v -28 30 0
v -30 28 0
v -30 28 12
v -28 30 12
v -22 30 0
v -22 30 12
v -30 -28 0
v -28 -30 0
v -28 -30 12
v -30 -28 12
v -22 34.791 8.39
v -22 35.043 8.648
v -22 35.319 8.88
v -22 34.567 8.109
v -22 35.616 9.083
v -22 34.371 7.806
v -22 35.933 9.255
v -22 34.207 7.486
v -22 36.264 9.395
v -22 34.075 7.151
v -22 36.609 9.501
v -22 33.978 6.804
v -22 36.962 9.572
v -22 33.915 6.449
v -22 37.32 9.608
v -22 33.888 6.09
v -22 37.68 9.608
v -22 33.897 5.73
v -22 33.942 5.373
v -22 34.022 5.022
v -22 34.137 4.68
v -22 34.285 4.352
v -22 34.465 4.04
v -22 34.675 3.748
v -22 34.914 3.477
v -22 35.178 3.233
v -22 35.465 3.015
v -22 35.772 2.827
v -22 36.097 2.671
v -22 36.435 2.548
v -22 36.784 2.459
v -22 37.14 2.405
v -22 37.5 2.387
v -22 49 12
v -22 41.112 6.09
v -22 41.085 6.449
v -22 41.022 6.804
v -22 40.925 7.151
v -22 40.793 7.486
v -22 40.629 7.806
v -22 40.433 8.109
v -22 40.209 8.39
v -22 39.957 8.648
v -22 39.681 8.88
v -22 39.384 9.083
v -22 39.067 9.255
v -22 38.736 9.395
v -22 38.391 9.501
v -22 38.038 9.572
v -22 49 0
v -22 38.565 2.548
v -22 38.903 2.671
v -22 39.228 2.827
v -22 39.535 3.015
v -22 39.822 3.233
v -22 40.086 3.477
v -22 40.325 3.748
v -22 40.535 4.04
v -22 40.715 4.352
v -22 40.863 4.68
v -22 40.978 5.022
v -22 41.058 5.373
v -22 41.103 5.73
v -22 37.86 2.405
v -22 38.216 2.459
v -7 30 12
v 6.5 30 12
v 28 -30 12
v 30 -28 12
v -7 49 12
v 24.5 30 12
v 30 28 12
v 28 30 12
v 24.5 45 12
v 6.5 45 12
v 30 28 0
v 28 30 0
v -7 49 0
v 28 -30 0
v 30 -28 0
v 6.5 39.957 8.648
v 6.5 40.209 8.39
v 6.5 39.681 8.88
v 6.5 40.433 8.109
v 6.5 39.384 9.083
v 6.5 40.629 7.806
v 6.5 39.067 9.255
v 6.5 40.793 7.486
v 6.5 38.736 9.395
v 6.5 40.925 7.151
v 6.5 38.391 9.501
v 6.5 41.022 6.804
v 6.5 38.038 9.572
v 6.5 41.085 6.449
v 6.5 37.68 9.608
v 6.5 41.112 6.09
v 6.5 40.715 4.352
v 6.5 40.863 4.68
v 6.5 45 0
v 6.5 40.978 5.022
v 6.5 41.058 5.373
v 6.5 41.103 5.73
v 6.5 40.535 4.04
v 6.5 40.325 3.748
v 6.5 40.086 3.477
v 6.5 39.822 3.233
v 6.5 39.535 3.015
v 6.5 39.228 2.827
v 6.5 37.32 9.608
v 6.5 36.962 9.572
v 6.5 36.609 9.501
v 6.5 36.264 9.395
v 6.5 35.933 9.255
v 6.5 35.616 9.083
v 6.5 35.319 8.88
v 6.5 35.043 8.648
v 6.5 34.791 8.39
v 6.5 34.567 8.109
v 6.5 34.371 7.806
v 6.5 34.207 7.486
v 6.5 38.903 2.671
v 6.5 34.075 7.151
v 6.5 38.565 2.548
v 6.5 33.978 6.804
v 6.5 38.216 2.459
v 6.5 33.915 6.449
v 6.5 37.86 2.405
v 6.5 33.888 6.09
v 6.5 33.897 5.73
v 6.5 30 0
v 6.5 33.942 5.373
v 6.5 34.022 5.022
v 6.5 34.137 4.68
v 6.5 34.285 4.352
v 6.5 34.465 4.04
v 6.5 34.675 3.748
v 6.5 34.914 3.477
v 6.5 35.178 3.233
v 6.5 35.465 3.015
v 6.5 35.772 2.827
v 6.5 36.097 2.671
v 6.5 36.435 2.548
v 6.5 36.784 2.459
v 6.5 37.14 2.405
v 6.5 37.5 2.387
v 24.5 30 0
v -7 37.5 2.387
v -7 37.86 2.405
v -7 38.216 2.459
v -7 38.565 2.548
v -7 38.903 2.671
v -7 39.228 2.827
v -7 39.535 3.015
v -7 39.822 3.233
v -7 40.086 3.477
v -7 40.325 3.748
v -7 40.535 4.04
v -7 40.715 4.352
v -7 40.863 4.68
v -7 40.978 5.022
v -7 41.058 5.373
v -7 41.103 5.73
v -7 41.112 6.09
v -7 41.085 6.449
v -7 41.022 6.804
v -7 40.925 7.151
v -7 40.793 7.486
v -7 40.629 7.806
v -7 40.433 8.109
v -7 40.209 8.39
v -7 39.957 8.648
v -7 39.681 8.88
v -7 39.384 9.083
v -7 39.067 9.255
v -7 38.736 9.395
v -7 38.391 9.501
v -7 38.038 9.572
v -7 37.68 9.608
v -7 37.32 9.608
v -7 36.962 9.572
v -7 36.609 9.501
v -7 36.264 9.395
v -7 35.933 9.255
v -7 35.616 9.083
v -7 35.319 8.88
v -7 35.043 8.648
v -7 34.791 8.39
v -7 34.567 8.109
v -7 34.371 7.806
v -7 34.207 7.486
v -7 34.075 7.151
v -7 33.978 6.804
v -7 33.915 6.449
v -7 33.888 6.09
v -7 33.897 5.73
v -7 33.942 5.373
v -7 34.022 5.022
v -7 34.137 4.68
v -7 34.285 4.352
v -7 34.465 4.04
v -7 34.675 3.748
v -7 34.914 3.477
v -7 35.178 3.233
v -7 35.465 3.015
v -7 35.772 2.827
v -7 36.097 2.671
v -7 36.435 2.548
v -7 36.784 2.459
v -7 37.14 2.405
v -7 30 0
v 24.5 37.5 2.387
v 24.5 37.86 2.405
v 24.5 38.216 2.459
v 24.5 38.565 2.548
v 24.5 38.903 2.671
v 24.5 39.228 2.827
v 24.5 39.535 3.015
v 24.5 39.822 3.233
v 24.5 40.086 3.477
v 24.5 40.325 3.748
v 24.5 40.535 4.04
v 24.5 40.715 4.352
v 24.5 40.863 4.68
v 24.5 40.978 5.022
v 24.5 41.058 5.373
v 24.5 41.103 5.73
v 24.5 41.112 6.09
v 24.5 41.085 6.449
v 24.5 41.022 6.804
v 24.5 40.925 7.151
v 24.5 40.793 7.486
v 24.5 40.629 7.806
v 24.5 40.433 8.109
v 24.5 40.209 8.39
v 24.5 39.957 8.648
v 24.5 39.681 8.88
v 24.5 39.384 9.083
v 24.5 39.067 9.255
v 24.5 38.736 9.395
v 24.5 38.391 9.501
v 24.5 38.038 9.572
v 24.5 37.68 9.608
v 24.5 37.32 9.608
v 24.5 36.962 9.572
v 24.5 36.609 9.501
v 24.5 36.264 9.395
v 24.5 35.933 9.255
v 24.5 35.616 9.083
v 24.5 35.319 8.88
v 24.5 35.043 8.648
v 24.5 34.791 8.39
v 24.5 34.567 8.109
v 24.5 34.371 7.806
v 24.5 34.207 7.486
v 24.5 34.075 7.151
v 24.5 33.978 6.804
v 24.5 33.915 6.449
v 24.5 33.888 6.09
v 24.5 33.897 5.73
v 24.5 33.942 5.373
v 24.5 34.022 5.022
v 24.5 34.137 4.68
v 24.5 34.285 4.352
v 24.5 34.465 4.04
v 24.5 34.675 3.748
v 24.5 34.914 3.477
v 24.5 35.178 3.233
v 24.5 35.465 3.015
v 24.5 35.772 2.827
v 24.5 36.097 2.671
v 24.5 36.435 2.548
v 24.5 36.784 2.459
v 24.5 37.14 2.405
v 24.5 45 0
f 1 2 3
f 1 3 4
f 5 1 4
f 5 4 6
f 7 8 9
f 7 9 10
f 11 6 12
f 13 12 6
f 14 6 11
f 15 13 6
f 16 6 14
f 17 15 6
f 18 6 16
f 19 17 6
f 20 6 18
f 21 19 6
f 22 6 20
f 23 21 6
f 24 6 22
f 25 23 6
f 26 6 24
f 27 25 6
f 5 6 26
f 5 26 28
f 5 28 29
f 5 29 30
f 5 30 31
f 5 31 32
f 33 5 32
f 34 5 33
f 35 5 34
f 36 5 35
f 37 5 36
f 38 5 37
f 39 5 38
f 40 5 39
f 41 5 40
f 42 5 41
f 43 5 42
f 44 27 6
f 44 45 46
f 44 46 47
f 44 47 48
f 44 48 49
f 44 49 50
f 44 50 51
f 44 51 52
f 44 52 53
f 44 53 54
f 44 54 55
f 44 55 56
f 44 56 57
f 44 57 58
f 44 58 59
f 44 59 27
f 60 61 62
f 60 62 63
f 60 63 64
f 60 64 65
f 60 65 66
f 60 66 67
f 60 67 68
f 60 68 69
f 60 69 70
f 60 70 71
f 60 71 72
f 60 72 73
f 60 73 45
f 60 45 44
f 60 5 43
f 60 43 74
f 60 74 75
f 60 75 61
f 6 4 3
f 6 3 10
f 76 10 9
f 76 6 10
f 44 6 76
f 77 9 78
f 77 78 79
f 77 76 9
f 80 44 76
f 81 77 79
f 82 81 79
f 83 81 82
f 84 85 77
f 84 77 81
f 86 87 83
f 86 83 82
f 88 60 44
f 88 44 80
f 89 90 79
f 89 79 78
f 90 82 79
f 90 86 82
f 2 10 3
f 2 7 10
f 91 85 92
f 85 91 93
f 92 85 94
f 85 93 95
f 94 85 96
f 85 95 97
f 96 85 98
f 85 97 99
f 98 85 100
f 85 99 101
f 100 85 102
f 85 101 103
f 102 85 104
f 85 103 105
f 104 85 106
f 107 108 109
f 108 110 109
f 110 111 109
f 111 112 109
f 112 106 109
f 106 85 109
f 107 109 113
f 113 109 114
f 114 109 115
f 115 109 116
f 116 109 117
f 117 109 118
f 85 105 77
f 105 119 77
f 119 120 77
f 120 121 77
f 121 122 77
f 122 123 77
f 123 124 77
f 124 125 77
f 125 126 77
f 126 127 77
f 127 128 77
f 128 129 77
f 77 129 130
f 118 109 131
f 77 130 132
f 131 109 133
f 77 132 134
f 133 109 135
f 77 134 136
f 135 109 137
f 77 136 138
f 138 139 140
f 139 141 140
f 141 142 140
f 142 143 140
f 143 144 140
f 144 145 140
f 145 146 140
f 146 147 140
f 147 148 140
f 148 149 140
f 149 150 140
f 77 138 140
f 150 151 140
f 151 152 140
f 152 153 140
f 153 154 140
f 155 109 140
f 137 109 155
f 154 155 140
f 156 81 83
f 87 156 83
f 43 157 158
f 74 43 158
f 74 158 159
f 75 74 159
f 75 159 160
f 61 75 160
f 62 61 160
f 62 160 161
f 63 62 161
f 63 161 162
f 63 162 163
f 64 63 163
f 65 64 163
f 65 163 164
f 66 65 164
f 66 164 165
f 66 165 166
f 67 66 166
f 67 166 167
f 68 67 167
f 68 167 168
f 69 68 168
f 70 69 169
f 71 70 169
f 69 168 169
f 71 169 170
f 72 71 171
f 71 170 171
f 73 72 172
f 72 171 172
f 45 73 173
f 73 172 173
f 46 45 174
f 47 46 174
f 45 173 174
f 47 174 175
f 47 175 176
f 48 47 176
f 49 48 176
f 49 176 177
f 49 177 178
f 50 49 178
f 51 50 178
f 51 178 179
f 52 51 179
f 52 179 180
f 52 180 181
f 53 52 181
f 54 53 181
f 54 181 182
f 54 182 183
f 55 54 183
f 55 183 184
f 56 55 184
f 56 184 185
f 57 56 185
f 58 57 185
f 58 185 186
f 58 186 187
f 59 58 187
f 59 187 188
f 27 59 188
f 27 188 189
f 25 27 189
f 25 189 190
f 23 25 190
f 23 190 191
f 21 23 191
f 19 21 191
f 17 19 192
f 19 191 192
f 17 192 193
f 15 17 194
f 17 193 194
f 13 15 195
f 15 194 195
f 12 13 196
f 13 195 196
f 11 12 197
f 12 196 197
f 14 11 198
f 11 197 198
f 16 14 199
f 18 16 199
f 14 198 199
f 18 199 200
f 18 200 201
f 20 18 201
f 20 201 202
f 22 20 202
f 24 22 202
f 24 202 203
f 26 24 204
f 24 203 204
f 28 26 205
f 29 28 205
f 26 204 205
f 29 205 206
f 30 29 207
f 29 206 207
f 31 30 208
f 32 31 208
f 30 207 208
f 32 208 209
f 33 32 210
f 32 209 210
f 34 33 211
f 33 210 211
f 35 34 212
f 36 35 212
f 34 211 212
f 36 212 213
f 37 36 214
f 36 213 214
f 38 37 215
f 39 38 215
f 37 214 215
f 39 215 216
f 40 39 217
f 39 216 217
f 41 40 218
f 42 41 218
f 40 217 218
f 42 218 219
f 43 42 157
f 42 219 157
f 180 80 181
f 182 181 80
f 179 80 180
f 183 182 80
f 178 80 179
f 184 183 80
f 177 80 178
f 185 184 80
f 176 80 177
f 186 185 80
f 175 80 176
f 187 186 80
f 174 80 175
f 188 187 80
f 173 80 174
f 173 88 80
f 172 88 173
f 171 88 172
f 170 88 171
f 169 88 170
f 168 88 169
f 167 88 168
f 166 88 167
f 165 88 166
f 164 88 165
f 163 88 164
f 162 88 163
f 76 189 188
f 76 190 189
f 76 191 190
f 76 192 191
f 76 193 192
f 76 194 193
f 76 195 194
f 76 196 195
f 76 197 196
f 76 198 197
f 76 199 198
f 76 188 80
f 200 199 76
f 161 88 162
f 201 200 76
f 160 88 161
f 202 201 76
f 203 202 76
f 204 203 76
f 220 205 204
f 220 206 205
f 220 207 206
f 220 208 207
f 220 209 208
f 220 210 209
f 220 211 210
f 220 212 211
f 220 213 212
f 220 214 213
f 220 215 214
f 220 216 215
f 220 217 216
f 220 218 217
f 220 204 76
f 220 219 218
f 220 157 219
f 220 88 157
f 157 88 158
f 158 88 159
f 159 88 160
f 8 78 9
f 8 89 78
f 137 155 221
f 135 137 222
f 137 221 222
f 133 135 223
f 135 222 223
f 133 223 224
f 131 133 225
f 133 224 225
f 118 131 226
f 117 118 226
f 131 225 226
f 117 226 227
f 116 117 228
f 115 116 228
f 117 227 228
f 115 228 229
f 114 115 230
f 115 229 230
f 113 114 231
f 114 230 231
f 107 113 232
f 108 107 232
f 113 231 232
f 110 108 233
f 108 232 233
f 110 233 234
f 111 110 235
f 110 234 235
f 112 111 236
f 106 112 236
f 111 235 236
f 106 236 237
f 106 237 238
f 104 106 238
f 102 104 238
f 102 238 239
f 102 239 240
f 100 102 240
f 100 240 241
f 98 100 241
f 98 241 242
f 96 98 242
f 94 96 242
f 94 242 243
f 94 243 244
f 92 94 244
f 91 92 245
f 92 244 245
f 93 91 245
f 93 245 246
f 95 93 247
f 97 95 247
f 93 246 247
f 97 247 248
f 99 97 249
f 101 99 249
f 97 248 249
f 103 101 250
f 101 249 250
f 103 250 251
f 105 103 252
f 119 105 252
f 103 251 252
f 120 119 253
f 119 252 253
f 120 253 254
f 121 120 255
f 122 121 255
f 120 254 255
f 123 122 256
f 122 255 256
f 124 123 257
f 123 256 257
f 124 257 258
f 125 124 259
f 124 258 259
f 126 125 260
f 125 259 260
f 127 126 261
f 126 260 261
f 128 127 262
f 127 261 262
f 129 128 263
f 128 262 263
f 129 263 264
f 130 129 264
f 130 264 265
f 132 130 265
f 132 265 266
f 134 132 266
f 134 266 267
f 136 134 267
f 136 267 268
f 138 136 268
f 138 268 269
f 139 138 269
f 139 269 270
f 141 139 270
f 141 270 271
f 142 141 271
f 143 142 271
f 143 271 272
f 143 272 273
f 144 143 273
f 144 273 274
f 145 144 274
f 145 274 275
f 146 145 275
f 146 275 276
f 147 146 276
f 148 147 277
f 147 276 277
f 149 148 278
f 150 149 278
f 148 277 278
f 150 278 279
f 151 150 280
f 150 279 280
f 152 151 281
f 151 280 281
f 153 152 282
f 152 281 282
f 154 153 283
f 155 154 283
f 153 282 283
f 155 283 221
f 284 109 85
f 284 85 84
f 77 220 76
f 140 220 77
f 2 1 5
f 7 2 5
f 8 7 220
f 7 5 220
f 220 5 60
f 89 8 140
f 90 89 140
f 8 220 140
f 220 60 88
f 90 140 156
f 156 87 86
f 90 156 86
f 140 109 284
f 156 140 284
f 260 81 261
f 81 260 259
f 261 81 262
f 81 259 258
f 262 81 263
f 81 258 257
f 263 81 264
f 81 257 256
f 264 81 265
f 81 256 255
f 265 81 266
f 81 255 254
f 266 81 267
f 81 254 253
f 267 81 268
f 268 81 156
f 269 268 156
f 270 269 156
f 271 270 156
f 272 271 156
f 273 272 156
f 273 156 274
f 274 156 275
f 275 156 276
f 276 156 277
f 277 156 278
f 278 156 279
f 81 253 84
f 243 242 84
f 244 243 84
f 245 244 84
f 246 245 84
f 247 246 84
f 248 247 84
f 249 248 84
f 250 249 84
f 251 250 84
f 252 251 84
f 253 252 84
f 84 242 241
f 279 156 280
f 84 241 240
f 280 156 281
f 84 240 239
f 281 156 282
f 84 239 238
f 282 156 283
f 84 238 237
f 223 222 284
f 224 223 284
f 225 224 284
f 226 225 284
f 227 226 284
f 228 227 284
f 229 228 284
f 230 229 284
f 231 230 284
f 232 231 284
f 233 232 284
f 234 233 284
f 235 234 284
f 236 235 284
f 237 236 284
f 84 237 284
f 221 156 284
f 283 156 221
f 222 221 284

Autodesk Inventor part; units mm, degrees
ref_plane "YZ Plane" through (0, 0, 0) normal (1, 0, 0) x (0, 1, 0)
ref_plane "XZ Plane" through (0, 0, 0) normal (0, 1, 0) x (-1, 0, 0)
ref_plane "XY Plane" through (0, 0, 0) normal (0, 0, 1) x (1, 0, 0)
ref_plane "Work Plane1" through (0, 0, 0) normal (0, 0, 1) x (1, 0, 0)
sketch "Sketch1" plane through (0, 0, 0) normal (0, 0, 1) x (1, 0, 0)
  circle A0 centre (17.5, 17.5) radius 1.95 projected
  circle A1 centre (17.5, -17.5) radius 1.95 projected
  circle A2 centre (-17.5, -17.5) radius 1.95 projected
  circle A3 centre (-17.5, 17.5) radius 1.95 projected
  circle A4 centre (0, 0) radius 7.5 projected
  line L0 (-30, 28) -> (-28, 30) projected
  line L1 (-30, -28) -> (-30, 28) projected
  line L2 (-28, -30) -> (-30, -28) projected
  line L3 (28, -30) -> (-28, -30) projected
  line L4 (30, -28) -> (28, -30) projected
  line L5 (30, 28) -> (30, -28) projected
  line L6 (28, 30) -> (30, 28) projected
  line L7 (-28, 30) -> (28, 30) projected
extrude "Extrusion1" add sketch "Sketch1" along normal blind 12 contours A0 | A1 | A2 | A3 | A4 | L0 L7 L6 L5 L4 L3 L2 L1
sketch "Sketch2" plane through (0, 0, 12) normal (0, 0, 1) x (1, 0, 0)
  point P0 (0, 0)
sketch "Sketch5" plane through (0, 0, 0) normal (0, 0, -1) x (-1, 0, 0)
  line L0 (49, -22) -> (49, -7)
  line L1 (30, -28) -> (30, 28) projected
  line L2 (45, 6.5) -> (45, 24.5)
  line L3 (49, -7) -> (30, -7)
  line L4 (30, -7) -> (30, -22)
  line L5 (30, -22) -> (49, -22)
  line L6 (49, -22) -> (49, -7)
  line L7 (45, 6.5) -> (30, 6.5)
  line L8 (30, 6.5) -> (30, 24.5)
  line L9 (30, 24.5) -> (45, 24.5)
  line L10 (45, 24.5) -> (45, 6.5)
  line L11 (22, 49) -> (7, 49)
  line L12 (-6.5, 45) -> (-24.5, 45)
  line L13 (7, 49) -> (7, 30)
  line L14 (7, 30) -> (22, 30)
  line L15 (22, 30) -> (22, 49)
  line L16 (22, 49) -> (7, 49)
  line L17 (-6.5, 45) -> (-6.5, 30)
  line L18 (-6.5, 30) -> (-24.5, 30)
  line L19 (-24.5, 30) -> (-24.5, 45)
  line L20 (-24.5, 45) -> (-6.5, 45)
  point P0 (0, 0)
  point P1 (-28, 30)
  dimension "d12" = 90
extrude "Extrusion4" add sketch "Sketch5" against normal up to surface (12 mm away) contours L15 L14 L13 L11 | L17 L18 L19 L12
sketch "Sketch6" plane through (24.5, 30, 0) normal (1, 0, 0) x (0, 0, -1)
  line L0 (-12, 0) -> (-12, 15) projected
  line L1 (0, 0) -> (-12, 0) projected
  line L2 (0, 0) -> (0, 15) projected
  line L3 (0, 15) -> (-12, 15) projected
  circle A0 centre (-6, 7.5) radius 3.6127
  point P0 (0, -30)
extrude "Extrusion5" cut sketch "Sketch6" against normal through all contours A0
properties part number "00_XY_stage-CHUO_SEIKI_LD-647-R1-Middle"
